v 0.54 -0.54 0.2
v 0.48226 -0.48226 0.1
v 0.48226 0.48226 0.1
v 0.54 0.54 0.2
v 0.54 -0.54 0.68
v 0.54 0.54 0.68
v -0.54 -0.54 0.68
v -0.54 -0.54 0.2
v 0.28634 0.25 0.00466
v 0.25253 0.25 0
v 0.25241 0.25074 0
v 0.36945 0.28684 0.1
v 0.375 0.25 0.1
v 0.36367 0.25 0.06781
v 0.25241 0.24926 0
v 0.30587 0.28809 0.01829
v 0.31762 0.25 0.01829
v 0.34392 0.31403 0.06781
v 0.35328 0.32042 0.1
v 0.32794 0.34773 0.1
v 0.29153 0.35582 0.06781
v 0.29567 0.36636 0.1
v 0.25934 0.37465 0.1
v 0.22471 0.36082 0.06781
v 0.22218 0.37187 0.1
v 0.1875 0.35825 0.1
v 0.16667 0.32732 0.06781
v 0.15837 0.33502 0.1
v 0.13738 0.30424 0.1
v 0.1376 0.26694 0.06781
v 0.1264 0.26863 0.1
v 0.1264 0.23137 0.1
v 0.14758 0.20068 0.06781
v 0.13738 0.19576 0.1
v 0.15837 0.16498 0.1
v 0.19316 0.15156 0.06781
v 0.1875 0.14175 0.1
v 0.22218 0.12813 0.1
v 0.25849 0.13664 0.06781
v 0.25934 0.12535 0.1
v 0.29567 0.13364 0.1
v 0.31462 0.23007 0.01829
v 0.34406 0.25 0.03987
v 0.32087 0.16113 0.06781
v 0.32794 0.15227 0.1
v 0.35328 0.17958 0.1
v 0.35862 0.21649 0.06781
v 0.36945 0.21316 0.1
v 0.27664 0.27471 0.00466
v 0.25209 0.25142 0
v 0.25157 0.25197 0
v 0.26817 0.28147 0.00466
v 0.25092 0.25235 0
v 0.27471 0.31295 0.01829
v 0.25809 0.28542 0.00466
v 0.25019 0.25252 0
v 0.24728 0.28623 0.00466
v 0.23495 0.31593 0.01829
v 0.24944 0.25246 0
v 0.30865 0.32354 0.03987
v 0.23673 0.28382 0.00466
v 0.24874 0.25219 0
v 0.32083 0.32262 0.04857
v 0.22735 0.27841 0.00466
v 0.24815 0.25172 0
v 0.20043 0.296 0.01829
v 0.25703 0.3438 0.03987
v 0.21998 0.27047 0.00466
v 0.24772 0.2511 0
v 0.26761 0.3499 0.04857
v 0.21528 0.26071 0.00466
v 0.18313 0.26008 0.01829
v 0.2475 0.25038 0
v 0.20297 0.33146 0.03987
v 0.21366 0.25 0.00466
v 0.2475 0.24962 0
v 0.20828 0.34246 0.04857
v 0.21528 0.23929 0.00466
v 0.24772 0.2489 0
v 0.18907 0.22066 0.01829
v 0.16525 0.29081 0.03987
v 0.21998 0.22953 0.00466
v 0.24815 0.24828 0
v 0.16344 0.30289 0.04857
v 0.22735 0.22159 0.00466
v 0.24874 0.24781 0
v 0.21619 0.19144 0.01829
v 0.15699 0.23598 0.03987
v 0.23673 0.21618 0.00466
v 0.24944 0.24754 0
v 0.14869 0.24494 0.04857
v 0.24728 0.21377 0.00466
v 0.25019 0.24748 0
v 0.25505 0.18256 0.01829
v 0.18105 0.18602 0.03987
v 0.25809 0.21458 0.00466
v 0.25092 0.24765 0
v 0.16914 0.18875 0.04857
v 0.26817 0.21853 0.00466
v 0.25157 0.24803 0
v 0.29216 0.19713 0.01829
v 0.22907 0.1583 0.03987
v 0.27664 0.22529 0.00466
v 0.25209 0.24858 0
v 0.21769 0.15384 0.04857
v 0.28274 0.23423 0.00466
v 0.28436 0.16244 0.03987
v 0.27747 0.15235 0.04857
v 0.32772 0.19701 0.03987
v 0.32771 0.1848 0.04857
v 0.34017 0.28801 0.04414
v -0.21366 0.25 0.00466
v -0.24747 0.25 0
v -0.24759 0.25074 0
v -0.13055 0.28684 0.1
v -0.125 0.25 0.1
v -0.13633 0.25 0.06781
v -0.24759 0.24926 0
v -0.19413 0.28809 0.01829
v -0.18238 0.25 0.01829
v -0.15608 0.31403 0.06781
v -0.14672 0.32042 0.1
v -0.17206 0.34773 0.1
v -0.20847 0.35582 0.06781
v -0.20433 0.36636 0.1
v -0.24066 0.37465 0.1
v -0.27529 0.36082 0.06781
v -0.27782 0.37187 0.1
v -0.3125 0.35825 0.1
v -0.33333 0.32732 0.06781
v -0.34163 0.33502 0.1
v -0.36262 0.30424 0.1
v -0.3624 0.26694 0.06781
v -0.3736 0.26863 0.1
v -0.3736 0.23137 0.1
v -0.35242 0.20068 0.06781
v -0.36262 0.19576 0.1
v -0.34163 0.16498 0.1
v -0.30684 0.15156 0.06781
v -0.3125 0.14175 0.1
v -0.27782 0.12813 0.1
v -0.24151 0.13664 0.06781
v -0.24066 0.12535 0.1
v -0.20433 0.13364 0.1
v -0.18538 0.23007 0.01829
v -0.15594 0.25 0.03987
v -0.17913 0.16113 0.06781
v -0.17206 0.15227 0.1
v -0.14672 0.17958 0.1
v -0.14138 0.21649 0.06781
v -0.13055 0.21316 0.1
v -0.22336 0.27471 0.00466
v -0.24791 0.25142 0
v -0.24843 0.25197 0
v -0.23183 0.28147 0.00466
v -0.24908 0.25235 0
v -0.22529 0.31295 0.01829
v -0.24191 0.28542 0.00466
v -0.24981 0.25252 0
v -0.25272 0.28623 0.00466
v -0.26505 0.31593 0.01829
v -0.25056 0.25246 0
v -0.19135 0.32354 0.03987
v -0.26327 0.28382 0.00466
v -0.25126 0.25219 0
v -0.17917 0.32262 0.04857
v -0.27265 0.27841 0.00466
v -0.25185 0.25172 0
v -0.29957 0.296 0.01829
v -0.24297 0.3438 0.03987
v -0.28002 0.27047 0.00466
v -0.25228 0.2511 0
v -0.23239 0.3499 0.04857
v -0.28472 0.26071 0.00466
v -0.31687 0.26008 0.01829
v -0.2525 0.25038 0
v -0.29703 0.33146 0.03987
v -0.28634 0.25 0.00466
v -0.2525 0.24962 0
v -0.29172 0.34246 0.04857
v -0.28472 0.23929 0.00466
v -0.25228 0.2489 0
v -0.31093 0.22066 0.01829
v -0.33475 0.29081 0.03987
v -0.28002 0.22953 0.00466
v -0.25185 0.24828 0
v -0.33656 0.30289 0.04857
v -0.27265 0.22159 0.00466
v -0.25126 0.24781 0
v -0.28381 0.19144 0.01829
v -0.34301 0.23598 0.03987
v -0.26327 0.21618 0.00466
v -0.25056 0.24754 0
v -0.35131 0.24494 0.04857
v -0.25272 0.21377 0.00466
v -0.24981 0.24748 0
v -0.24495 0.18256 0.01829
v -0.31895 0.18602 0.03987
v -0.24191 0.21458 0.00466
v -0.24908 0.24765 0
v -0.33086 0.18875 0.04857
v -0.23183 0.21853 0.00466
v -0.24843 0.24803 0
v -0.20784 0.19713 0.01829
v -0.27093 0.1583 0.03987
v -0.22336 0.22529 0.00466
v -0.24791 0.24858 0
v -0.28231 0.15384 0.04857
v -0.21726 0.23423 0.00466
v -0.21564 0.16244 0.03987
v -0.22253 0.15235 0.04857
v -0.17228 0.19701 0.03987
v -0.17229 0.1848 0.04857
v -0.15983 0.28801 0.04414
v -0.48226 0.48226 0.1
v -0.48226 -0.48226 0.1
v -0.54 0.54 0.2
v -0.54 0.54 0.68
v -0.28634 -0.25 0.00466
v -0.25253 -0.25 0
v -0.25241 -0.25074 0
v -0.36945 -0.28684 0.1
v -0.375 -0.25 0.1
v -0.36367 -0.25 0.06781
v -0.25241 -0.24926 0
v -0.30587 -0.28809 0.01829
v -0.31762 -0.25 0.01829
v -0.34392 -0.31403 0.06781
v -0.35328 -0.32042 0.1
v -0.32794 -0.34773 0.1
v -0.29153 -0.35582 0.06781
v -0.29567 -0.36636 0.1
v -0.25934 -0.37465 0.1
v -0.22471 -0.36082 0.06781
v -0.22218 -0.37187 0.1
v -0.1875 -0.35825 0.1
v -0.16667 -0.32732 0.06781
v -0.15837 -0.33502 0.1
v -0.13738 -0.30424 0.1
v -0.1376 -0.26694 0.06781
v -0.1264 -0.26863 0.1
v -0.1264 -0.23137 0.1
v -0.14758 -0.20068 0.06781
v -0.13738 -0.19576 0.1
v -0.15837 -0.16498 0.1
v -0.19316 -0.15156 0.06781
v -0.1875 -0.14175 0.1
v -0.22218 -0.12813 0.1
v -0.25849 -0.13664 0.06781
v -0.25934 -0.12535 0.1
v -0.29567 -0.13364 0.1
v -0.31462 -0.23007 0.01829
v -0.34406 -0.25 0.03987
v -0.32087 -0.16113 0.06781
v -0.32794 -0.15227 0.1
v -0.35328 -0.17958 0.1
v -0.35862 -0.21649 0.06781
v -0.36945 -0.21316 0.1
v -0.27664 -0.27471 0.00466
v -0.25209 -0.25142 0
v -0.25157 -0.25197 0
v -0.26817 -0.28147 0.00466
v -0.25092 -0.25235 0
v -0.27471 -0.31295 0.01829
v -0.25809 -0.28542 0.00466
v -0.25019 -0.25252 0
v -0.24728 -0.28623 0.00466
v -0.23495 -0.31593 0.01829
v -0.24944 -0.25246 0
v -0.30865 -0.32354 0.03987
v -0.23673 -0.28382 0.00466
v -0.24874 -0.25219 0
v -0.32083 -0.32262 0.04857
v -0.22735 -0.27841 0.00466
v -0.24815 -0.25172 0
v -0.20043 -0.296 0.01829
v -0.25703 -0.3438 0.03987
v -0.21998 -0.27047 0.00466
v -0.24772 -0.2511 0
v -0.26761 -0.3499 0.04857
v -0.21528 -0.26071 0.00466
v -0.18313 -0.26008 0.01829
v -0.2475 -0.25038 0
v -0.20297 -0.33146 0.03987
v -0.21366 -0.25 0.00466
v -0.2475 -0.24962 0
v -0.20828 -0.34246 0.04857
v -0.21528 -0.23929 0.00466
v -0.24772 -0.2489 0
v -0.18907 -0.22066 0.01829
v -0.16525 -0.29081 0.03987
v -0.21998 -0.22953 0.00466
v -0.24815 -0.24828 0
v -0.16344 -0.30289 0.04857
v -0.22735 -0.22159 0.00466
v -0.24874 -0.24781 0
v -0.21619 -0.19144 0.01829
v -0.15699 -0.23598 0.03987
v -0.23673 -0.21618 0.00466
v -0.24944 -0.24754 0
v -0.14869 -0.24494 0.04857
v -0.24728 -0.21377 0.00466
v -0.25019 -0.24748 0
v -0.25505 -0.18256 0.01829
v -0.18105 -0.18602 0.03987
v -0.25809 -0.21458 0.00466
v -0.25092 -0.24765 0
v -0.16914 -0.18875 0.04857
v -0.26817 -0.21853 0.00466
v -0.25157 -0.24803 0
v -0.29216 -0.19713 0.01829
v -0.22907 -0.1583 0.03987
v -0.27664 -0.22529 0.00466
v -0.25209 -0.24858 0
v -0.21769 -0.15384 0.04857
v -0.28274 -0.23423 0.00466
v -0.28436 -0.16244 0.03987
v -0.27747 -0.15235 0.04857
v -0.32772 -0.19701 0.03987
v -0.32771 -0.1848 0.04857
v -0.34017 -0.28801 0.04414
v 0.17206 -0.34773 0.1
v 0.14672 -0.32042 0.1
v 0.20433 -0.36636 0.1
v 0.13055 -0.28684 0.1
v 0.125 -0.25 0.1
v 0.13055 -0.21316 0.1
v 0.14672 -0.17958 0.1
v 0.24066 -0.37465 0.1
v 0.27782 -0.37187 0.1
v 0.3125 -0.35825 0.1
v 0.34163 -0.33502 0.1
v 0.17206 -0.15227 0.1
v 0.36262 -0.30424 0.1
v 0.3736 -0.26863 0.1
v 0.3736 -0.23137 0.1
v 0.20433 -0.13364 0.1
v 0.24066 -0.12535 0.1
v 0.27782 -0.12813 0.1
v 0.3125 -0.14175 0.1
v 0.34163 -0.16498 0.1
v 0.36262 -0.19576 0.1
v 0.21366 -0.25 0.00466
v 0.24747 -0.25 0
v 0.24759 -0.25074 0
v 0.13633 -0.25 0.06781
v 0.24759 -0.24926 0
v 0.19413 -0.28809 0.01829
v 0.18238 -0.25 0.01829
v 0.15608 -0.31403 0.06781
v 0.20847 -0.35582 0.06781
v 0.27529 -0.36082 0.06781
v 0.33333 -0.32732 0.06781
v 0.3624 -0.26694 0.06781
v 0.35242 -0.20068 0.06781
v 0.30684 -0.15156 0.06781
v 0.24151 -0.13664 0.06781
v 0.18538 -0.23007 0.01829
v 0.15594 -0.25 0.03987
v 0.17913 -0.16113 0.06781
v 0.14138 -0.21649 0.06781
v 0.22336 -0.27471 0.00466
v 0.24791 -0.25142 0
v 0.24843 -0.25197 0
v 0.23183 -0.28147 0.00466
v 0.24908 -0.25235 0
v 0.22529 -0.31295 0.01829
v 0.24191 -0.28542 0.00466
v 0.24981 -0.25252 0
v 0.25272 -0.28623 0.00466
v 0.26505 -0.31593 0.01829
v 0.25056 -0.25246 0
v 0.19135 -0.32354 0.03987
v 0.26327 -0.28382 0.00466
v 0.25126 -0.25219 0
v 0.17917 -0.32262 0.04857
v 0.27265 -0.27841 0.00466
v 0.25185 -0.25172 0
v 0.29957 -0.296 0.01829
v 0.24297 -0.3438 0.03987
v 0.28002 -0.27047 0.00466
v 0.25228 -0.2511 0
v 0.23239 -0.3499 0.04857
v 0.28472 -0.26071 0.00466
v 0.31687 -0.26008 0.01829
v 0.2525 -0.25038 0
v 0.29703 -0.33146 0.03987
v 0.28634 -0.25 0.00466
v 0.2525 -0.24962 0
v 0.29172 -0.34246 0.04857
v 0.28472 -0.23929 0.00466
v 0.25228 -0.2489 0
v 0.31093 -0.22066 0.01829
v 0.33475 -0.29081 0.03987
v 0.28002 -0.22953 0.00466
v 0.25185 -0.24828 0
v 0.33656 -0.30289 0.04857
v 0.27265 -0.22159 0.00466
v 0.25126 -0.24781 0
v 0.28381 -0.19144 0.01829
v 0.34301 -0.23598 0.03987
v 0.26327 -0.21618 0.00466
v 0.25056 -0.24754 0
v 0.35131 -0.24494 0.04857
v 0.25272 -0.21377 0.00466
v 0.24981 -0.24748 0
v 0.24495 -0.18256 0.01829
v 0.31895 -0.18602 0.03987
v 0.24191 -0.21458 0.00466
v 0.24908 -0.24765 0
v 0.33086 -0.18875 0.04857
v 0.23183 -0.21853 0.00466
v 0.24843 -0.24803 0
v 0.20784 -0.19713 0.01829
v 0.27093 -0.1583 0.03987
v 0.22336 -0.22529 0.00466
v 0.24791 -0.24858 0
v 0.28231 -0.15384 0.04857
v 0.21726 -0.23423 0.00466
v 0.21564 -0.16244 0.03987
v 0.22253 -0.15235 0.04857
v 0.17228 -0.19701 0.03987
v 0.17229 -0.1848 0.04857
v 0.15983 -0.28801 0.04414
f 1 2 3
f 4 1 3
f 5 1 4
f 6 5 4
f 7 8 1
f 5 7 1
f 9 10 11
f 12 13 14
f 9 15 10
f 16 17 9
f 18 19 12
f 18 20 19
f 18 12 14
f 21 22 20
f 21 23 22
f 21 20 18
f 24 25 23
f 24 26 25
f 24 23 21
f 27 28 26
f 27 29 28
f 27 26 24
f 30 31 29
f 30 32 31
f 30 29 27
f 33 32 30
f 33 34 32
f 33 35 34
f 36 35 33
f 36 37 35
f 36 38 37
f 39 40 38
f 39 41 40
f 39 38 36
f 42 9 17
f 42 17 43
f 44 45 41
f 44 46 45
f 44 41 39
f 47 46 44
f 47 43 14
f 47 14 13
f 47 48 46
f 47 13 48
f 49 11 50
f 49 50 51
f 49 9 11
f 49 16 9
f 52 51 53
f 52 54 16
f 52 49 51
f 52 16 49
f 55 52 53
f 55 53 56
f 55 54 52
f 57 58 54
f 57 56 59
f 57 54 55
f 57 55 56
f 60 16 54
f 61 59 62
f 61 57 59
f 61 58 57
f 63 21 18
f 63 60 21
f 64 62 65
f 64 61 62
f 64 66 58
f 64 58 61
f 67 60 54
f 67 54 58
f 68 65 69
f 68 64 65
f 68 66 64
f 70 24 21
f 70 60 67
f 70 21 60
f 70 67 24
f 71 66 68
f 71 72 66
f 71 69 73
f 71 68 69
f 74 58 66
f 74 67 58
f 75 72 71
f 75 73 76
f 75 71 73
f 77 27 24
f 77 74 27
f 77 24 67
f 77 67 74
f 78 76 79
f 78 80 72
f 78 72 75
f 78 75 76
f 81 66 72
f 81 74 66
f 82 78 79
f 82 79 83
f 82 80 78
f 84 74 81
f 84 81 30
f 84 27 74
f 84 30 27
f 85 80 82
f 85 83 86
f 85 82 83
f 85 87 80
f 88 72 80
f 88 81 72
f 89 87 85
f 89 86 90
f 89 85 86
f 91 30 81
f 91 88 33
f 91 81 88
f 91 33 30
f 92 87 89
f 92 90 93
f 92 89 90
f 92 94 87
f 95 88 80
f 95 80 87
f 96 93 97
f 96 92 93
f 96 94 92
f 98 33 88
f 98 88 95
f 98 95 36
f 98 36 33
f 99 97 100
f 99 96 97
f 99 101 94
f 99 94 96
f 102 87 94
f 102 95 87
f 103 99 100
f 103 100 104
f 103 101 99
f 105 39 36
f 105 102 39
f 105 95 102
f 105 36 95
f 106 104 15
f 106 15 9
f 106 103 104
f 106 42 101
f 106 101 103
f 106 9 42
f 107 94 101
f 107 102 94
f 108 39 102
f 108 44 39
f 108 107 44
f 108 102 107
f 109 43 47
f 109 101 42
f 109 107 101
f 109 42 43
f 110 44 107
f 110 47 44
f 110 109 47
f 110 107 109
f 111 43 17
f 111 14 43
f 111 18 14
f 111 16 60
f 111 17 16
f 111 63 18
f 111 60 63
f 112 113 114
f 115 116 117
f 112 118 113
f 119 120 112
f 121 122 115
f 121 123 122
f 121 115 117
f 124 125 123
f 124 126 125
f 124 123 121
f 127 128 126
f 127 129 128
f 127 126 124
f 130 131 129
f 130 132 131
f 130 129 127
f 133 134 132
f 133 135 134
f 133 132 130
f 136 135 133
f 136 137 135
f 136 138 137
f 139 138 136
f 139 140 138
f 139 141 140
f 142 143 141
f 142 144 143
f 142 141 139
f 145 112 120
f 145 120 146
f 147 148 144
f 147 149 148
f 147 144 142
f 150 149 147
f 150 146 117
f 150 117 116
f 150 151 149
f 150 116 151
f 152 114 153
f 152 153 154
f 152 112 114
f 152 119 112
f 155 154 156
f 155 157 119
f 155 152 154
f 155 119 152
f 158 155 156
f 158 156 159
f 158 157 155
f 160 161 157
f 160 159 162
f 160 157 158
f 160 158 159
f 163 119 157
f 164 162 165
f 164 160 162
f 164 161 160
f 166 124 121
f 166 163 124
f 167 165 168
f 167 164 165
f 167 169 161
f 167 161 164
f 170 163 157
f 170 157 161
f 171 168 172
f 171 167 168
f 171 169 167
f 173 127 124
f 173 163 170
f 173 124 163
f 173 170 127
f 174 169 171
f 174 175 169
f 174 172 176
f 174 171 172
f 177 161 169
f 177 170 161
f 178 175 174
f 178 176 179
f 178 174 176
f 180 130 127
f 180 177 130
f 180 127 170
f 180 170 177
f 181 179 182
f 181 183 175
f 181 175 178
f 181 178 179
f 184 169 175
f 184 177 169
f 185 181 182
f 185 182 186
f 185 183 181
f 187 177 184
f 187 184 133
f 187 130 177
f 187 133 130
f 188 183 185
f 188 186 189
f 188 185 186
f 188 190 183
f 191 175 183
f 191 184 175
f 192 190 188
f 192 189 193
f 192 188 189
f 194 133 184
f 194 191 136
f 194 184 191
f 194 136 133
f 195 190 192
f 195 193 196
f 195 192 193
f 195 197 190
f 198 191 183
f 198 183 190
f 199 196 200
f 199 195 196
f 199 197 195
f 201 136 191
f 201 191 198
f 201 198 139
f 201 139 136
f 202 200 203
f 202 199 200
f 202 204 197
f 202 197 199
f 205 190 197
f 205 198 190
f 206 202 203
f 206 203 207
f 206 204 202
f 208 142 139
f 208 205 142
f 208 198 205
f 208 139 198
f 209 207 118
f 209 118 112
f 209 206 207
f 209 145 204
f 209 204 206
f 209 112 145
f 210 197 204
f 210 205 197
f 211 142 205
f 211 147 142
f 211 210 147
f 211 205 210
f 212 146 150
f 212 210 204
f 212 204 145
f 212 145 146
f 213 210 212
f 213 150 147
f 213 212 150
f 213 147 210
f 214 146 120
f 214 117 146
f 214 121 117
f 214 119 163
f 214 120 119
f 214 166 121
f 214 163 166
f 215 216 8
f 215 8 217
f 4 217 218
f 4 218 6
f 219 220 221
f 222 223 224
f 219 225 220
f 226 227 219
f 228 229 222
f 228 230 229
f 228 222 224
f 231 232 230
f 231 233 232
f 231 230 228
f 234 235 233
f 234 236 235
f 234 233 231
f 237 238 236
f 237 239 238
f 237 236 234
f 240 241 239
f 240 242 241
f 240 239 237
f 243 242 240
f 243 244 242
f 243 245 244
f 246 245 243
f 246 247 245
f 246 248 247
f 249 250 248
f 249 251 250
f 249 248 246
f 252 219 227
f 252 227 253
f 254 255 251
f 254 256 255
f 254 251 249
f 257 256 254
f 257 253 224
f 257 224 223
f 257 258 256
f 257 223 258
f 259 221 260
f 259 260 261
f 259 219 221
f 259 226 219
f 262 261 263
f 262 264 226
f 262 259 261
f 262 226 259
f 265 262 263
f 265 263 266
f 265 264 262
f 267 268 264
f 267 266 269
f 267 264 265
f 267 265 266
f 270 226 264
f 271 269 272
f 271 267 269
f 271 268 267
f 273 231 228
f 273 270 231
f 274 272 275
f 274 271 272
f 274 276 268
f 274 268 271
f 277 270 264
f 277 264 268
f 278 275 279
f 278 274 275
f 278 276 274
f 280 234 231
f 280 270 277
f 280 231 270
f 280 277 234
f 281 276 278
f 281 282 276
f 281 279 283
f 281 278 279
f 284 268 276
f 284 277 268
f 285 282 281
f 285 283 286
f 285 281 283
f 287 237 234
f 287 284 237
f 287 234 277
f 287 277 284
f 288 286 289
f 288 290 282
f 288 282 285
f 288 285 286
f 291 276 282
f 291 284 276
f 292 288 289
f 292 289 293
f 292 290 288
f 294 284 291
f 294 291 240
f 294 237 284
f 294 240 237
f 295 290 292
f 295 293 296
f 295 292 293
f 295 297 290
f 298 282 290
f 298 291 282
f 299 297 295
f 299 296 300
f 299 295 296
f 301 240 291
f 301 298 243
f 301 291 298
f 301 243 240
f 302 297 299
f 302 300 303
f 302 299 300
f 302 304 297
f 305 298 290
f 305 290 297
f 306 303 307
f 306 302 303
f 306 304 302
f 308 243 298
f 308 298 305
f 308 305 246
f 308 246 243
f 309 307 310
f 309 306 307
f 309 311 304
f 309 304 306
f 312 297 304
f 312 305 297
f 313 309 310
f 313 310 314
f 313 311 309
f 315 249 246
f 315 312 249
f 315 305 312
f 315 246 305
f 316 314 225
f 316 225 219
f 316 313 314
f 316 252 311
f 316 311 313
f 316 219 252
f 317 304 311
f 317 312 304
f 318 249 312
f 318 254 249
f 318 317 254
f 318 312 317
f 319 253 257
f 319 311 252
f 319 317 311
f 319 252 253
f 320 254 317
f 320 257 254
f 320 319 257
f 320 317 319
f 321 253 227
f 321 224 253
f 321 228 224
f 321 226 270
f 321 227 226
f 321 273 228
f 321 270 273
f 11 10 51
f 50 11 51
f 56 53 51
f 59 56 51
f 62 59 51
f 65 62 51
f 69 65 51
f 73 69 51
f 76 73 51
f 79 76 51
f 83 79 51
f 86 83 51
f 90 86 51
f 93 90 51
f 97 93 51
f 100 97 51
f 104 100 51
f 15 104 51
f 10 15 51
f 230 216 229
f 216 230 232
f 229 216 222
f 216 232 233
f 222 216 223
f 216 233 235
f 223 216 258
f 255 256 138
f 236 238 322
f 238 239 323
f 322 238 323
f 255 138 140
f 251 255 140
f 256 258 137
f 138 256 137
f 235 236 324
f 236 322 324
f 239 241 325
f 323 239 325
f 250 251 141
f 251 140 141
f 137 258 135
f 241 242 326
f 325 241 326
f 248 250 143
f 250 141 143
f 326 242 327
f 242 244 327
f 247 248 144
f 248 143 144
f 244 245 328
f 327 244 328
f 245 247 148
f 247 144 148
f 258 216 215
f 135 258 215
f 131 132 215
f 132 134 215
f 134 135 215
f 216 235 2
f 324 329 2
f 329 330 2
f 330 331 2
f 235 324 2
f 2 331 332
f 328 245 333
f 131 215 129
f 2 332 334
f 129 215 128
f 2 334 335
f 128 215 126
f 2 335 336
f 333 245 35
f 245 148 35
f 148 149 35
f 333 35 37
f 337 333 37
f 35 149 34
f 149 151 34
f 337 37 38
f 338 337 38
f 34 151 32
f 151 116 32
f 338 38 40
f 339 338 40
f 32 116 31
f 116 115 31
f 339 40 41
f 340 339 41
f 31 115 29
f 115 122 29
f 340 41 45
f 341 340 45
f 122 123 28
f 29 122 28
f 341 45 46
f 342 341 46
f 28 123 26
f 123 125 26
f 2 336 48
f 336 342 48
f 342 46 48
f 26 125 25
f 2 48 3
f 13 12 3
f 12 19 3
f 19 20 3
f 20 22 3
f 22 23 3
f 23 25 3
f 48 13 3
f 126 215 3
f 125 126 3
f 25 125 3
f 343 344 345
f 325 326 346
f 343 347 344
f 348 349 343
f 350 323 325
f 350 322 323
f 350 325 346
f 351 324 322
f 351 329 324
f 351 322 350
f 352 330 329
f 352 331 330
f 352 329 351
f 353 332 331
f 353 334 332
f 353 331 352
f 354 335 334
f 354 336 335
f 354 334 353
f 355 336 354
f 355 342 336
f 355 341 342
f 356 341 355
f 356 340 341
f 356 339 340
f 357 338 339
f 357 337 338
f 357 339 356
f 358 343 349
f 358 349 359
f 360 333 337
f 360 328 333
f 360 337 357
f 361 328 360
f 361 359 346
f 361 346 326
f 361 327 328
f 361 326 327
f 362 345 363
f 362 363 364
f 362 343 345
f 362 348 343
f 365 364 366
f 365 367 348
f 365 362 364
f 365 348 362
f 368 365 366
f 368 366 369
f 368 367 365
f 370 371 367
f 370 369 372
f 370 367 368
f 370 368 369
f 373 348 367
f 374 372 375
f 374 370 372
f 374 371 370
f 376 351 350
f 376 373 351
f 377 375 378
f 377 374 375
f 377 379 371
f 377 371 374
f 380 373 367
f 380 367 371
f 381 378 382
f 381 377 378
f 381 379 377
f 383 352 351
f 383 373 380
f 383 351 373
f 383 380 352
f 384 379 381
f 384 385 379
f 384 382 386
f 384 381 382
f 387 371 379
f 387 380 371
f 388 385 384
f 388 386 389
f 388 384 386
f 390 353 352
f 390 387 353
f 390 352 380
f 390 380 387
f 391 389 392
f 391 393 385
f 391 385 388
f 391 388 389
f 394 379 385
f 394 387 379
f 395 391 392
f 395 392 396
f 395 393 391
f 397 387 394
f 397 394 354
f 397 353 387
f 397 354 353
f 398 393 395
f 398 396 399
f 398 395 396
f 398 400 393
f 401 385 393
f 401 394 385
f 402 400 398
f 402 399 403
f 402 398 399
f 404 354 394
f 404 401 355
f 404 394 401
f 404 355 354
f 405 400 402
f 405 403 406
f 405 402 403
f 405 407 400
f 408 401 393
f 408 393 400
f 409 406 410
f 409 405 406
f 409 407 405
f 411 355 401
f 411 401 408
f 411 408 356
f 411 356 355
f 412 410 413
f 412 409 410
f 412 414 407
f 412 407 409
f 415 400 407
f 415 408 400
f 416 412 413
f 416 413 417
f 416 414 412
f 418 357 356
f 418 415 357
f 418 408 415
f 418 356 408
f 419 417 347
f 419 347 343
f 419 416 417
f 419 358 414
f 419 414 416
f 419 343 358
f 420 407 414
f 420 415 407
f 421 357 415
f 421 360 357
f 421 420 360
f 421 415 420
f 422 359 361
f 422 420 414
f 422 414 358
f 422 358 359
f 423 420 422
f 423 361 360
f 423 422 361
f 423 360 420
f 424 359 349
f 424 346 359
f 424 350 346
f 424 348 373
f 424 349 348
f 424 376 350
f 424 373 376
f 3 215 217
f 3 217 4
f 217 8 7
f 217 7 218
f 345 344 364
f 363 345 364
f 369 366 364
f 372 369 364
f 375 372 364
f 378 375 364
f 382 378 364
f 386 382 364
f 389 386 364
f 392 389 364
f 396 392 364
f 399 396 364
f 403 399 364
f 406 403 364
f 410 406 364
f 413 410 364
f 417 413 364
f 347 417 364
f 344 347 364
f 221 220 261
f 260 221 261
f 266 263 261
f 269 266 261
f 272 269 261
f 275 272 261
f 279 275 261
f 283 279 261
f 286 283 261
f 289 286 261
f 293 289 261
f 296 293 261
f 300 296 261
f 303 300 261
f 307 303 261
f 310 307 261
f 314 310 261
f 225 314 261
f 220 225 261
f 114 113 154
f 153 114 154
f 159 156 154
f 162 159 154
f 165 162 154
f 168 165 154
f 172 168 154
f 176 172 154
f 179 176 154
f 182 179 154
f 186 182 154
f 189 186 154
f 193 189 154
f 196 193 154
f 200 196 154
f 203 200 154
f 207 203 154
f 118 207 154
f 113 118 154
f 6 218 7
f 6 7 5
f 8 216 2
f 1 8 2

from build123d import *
from OCP.BRepFilletAPI import BRepFilletAPI_MakeChamfer

# Parameters (mm, degrees)
SKETCH2_W           = 1.08
SKETCH2_H           = 1.08
BOSS_EXTRUDE1_DEPTH = 0.68
MOVE_FACE1_BY       = 0.1
CHAMFER1_SIZE       = 0.1
CHAMFER1_SIZE2      = 0.057735027
SKETCH3_R           = 0.125
BOSS_EXTRUDE2_DEPTH = 0.1
FILLET1_R           = 0.125


with BuildPart() as part:
    # Sketch2 → Boss-Extrude1 (new body)
    with BuildSketch(Plane.XY):
        Rectangle(SKETCH2_W, SKETCH2_H)
    extrude(amount=BOSS_EXTRUDE1_DEPTH)

    # Move Face1: a face moved inward by 0.1
    extrude(part.faces().sort_by_distance((0, 0, 0))[0], amount=MOVE_FACE1_BY, dir=(0, 0, 1), mode=Mode.SUBTRACT)

    # Chamfer1: one chamfer whose edges measure the first distance from different faces: ONE call of the kernel's chamfer builder (chamfer() names one face for all edges)
    chamfer1_edges_1 = [part.edges().sort_by_distance(p)[0] for p in [
        (0, 0.54, 0.1),
    ]]
    chamfer1_side_1 = [part.faces().sort_by_distance(p)[0] for p in [
        (0, 0.54, 0.39),
    ]]
    chamfer1_edges_2 = [part.edges().sort_by_distance(p)[0] for p in [
        (0.54, 0, 0.1),
    ]]
    chamfer1_side_2 = [part.faces().sort_by_distance(p)[0] for p in [
        (0.54, 0, 0.39),
    ]]
    chamfer1_edges_3 = [part.edges().sort_by_distance(p)[0] for p in [
        (0, -0.54, 0.1),
    ]]
    chamfer1_side_3 = [part.faces().sort_by_distance(p)[0] for p in [
        (0, -0.54, 0.39),
    ]]
    chamfer1_edges_4 = [part.edges().sort_by_distance(p)[0] for p in [
        (-0.54, 0, 0.1),
    ]]
    chamfer1_side_4 = [part.faces().sort_by_distance(p)[0] for p in [
        (-0.54, 0, 0.39),
    ]]
    chamfer1 = BRepFilletAPI_MakeChamfer(part.part.solid().wrapped)
    for e in chamfer1_edges_1:
        chamfer1.Add(CHAMFER1_SIZE, CHAMFER1_SIZE2, e.wrapped, chamfer1_side_1[0].wrapped)  # the first distance lies on this face
    for e in chamfer1_edges_2:
        chamfer1.Add(CHAMFER1_SIZE, CHAMFER1_SIZE2, e.wrapped, chamfer1_side_2[0].wrapped)  # the first distance lies on this face
    for e in chamfer1_edges_3:
        chamfer1.Add(CHAMFER1_SIZE, CHAMFER1_SIZE2, e.wrapped, chamfer1_side_3[0].wrapped)  # the first distance lies on this face
    for e in chamfer1_edges_4:
        chamfer1.Add(CHAMFER1_SIZE, CHAMFER1_SIZE2, e.wrapped, chamfer1_side_4[0].wrapped)  # the first distance lies on this face
    add(Compound.cast(chamfer1.Shape()), mode=Mode.REPLACE)

    # Sketch3 → Boss-Extrude2 (add)
    with BuildSketch(Plane.XY):
        with Locations((-0.25, 0.25)):
            Circle(SKETCH3_R)
        with Locations(Location((0.25, -0.25, 0), (0, 0, 180))):
            Circle(SKETCH3_R)
        with Locations((0.25, 0.25)):
            Circle(SKETCH3_R)
        with Locations(Location((-0.25, -0.25, 0), (0, 0, 180))):
            Circle(SKETCH3_R)
    extrude(amount=BOSS_EXTRUDE2_DEPTH)

    # Fillet1
    # the kernel refuses this fillet: 0.125 mm, written as the material it takes off along each edge
    with BuildSketch(Plane(origin=(-0.25, 0.25, 0), x_dir=(1, 0, 0), z_dir=(0, -1, 0))) as fillet1_piece_1:
        with BuildLine():
            CenterArc((0.002525513, 0.125), FILLET1_R, 270, 78.463040967)
            Line((0.002525513, 0), (0.002525513, -0.0025))
            Line((0.002525513, -0.0025), (0.125, -0.0025))
            Line((0.125, -0.0025), (0.1275, 0))
            ThreePointArc((0.1275, 0), (0.1275, 0.05), (0.12744949, 0.0995))
            Line((0.12744949, 0.0995), (0.125, 0.1))
        make_face()
    revolve(axis=Axis((-0.25, 0.25, 0), (0, 0, 1)), mode=Mode.SUBTRACT)
    with BuildSketch(Plane(origin=(0.25, -0.25, 0), x_dir=(-1, 0, 0), z_dir=(0, 1, 0))) as fillet1_piece_2:
        with BuildLine():
            CenterArc((0.002525513, 0.125), FILLET1_R, 270, 78.463040967)
            Line((0.002525513, 0), (0.002525513, -0.0025))
            Line((0.002525513, -0.0025), (0.125, -0.0025))
            Line((0.125, -0.0025), (0.1275, 0))
            ThreePointArc((0.1275, 0), (0.1275, 0.05), (0.12744949, 0.0995))
            Line((0.12744949, 0.0995), (0.125, 0.1))
        make_face()
    revolve(axis=Axis((0.25, -0.25, 0), (0, 0, 1)), mode=Mode.SUBTRACT)
    with BuildSketch(Plane(origin=(0.25, 0.25, 0), x_dir=(1, 0, 0), z_dir=(0, -1, 0))) as fillet1_piece_3:
        with BuildLine():
            CenterArc((0.002525513, 0.125), FILLET1_R, 270, 78.463040967)
            Line((0.002525513, 0), (0.002525513, -0.0025))
            Line((0.002525513, -0.0025), (0.125, -0.0025))
            Line((0.125, -0.0025), (0.1275, 0))
            ThreePointArc((0.1275, 0), (0.1275, 0.05), (0.12744949, 0.0995))
            Line((0.12744949, 0.0995), (0.125, 0.1))
        make_face()
    revolve(axis=Axis((0.25, 0.25, 0), (0, 0, 1)), mode=Mode.SUBTRACT)
    with BuildSketch(Plane(origin=(-0.25, -0.25, 0), x_dir=(-1, 0, 0), z_dir=(0, 1, 0))) as fillet1_piece_4:
        with BuildLine():
            CenterArc((0.002525513, 0.125), FILLET1_R, 270, 78.463040967)
            Line((0.002525513, 0), (0.002525513, -0.0025))
            Line((0.002525513, -0.0025), (0.125, -0.0025))
            Line((0.125, -0.0025), (0.1275, 0))
            ThreePointArc((0.1275, 0), (0.1275, 0.05), (0.12744949, 0.0995))
            Line((0.12744949, 0.0995), (0.125, 0.1))
        make_face()
    revolve(axis=Axis((-0.25, -0.25, 0), (0, 0, 1)), mode=Mode.SUBTRACT)


solid = part.part
